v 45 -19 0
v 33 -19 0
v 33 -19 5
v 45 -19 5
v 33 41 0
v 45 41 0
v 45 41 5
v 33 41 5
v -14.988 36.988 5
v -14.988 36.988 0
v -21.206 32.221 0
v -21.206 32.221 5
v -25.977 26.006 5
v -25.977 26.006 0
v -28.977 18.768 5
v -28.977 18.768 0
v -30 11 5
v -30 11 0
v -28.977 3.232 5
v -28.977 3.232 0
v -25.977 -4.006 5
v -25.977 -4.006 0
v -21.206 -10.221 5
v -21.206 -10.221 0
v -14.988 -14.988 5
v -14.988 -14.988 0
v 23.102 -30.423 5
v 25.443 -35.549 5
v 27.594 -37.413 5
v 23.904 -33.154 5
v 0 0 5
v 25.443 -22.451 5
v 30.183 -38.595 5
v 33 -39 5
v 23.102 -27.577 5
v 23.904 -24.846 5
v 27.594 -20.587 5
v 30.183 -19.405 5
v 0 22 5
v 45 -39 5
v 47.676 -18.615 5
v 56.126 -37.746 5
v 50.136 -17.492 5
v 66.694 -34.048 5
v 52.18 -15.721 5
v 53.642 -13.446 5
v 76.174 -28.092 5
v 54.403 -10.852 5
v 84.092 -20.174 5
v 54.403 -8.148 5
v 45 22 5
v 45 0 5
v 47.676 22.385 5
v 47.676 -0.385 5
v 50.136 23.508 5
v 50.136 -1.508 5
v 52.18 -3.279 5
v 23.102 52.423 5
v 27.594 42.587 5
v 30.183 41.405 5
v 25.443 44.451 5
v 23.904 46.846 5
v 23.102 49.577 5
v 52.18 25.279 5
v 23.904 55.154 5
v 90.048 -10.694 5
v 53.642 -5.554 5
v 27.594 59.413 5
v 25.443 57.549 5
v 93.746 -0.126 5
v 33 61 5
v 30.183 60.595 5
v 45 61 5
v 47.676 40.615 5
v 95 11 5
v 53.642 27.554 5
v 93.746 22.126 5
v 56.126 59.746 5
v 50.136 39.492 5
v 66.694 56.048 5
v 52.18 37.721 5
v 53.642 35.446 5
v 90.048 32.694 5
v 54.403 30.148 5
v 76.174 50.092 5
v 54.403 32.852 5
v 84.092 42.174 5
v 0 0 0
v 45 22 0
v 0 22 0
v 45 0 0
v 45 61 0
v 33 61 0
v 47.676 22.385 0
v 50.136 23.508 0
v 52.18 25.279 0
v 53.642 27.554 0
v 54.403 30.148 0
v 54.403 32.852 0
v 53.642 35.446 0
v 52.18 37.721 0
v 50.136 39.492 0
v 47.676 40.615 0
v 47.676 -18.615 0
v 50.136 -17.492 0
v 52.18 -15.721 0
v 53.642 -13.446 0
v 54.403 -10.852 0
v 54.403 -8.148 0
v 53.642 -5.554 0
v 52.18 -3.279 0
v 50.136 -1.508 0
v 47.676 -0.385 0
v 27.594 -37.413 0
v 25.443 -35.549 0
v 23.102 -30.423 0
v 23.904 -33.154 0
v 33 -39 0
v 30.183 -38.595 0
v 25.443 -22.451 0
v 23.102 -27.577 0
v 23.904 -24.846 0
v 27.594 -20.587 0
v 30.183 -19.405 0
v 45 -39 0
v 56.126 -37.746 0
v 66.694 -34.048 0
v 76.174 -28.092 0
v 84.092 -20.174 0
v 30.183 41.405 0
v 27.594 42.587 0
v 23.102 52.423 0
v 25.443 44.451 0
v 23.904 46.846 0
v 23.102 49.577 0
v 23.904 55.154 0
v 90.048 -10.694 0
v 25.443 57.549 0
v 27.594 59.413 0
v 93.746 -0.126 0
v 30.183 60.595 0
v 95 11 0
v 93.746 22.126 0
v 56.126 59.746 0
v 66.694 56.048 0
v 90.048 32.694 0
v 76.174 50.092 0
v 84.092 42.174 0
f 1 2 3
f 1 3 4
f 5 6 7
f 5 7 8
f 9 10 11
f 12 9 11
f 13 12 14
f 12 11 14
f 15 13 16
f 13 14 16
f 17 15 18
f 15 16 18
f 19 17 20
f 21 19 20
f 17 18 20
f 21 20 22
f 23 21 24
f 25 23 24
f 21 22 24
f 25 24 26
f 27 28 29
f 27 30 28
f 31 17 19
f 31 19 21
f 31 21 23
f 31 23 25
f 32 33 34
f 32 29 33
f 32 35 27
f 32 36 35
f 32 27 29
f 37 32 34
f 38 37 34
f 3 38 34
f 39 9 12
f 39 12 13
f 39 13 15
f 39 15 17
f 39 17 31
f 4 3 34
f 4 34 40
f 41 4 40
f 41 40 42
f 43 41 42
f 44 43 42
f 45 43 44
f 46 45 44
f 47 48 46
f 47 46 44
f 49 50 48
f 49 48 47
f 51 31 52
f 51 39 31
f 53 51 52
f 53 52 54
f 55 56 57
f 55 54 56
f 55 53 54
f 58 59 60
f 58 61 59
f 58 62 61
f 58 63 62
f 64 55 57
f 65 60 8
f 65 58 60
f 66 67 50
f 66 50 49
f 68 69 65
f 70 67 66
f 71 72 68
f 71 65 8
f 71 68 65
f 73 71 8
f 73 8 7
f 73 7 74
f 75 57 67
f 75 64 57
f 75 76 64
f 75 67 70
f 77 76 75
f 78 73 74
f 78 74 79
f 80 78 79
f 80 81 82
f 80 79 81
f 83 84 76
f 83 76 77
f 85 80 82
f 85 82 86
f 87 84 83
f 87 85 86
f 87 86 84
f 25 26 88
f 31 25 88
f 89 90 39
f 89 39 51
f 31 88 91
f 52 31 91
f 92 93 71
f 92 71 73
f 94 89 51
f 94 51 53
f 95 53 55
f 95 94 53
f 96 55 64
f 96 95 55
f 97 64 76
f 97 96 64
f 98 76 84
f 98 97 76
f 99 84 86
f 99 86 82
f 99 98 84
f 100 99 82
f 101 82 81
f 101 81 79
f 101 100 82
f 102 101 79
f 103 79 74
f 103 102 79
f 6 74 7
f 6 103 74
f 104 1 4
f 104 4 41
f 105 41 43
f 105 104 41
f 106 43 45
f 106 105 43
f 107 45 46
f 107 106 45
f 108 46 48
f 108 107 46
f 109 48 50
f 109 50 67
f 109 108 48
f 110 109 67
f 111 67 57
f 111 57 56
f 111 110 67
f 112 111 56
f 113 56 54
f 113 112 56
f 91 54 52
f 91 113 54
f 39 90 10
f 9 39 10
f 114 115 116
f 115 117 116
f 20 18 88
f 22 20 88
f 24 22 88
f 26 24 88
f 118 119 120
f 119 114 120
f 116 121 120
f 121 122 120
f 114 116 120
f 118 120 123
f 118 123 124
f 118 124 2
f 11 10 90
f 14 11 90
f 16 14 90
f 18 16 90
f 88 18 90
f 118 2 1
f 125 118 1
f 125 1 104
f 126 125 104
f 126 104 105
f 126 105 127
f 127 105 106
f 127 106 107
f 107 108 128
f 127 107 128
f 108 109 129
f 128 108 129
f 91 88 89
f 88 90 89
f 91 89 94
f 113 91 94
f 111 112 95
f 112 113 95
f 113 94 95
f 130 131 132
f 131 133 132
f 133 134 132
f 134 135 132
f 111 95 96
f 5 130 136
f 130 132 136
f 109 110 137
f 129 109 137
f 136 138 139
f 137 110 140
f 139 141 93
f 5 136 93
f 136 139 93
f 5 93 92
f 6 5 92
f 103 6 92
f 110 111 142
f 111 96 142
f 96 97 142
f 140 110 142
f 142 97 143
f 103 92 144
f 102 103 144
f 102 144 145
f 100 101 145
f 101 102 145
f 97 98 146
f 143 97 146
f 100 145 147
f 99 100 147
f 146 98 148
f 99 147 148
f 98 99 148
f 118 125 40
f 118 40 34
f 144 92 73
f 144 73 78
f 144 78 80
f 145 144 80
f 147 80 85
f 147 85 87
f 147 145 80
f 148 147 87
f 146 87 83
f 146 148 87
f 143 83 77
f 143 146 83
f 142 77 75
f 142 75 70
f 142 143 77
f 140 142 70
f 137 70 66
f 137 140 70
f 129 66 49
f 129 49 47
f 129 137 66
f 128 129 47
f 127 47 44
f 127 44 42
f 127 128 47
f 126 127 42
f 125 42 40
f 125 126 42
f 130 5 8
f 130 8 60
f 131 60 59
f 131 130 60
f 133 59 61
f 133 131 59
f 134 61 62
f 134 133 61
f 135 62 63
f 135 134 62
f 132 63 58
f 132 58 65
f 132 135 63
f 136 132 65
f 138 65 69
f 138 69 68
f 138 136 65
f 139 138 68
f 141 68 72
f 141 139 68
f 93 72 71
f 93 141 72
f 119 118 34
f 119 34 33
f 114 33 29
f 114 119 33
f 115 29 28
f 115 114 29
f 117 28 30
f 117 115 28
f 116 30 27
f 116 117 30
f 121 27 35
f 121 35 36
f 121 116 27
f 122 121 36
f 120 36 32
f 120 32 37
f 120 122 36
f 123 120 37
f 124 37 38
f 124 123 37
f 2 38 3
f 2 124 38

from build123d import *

# Parameters (mm, degrees)
SKETCH1_W           = 45
SKETCH1_H           = 22
BOSS_EXTRUDE1_DEPTH = 5


with BuildPart() as part:
    # Sketch1 → Boss-Extrude1 (new body)
    with BuildSketch(Plane.XY):
        with BuildLine():
            Line((0, 22), (-14.987801249, 36.987801249))
            ThreePointArc((-14.987801249, 36.987801249), (-30, 11), (-14.987801249, -14.987801249))
            Line((-14.987801249, -14.987801249), (0, 0))
            Line((0, 0), (0, 22))
        make_face()
        with Locations((22.5, 11)):
            Rectangle(SKETCH1_W, SKETCH1_H)
        with BuildLine():
            ThreePointArc((45, -19), (54.5, -9.5), (45, 0))
            Line((45, 0), (45, 22))
            ThreePointArc((45, 22), (54.5, 31.5), (45, 41))
            Line((45, 41), (33, 41))
            ThreePointArc((33, 41), (23, 51), (33, 61))
            Line((33, 61), (45, 61))
            ThreePointArc((45, 61), (95, 11), (45, -39))
            Line((45, -39), (33, -39))
            ThreePointArc((33, -39), (23, -29), (33, -19))
            Line((33, -19), (45, -19))
        make_face()
    extrude(amount=BOSS_EXTRUDE1_DEPTH)


solid = part.part
